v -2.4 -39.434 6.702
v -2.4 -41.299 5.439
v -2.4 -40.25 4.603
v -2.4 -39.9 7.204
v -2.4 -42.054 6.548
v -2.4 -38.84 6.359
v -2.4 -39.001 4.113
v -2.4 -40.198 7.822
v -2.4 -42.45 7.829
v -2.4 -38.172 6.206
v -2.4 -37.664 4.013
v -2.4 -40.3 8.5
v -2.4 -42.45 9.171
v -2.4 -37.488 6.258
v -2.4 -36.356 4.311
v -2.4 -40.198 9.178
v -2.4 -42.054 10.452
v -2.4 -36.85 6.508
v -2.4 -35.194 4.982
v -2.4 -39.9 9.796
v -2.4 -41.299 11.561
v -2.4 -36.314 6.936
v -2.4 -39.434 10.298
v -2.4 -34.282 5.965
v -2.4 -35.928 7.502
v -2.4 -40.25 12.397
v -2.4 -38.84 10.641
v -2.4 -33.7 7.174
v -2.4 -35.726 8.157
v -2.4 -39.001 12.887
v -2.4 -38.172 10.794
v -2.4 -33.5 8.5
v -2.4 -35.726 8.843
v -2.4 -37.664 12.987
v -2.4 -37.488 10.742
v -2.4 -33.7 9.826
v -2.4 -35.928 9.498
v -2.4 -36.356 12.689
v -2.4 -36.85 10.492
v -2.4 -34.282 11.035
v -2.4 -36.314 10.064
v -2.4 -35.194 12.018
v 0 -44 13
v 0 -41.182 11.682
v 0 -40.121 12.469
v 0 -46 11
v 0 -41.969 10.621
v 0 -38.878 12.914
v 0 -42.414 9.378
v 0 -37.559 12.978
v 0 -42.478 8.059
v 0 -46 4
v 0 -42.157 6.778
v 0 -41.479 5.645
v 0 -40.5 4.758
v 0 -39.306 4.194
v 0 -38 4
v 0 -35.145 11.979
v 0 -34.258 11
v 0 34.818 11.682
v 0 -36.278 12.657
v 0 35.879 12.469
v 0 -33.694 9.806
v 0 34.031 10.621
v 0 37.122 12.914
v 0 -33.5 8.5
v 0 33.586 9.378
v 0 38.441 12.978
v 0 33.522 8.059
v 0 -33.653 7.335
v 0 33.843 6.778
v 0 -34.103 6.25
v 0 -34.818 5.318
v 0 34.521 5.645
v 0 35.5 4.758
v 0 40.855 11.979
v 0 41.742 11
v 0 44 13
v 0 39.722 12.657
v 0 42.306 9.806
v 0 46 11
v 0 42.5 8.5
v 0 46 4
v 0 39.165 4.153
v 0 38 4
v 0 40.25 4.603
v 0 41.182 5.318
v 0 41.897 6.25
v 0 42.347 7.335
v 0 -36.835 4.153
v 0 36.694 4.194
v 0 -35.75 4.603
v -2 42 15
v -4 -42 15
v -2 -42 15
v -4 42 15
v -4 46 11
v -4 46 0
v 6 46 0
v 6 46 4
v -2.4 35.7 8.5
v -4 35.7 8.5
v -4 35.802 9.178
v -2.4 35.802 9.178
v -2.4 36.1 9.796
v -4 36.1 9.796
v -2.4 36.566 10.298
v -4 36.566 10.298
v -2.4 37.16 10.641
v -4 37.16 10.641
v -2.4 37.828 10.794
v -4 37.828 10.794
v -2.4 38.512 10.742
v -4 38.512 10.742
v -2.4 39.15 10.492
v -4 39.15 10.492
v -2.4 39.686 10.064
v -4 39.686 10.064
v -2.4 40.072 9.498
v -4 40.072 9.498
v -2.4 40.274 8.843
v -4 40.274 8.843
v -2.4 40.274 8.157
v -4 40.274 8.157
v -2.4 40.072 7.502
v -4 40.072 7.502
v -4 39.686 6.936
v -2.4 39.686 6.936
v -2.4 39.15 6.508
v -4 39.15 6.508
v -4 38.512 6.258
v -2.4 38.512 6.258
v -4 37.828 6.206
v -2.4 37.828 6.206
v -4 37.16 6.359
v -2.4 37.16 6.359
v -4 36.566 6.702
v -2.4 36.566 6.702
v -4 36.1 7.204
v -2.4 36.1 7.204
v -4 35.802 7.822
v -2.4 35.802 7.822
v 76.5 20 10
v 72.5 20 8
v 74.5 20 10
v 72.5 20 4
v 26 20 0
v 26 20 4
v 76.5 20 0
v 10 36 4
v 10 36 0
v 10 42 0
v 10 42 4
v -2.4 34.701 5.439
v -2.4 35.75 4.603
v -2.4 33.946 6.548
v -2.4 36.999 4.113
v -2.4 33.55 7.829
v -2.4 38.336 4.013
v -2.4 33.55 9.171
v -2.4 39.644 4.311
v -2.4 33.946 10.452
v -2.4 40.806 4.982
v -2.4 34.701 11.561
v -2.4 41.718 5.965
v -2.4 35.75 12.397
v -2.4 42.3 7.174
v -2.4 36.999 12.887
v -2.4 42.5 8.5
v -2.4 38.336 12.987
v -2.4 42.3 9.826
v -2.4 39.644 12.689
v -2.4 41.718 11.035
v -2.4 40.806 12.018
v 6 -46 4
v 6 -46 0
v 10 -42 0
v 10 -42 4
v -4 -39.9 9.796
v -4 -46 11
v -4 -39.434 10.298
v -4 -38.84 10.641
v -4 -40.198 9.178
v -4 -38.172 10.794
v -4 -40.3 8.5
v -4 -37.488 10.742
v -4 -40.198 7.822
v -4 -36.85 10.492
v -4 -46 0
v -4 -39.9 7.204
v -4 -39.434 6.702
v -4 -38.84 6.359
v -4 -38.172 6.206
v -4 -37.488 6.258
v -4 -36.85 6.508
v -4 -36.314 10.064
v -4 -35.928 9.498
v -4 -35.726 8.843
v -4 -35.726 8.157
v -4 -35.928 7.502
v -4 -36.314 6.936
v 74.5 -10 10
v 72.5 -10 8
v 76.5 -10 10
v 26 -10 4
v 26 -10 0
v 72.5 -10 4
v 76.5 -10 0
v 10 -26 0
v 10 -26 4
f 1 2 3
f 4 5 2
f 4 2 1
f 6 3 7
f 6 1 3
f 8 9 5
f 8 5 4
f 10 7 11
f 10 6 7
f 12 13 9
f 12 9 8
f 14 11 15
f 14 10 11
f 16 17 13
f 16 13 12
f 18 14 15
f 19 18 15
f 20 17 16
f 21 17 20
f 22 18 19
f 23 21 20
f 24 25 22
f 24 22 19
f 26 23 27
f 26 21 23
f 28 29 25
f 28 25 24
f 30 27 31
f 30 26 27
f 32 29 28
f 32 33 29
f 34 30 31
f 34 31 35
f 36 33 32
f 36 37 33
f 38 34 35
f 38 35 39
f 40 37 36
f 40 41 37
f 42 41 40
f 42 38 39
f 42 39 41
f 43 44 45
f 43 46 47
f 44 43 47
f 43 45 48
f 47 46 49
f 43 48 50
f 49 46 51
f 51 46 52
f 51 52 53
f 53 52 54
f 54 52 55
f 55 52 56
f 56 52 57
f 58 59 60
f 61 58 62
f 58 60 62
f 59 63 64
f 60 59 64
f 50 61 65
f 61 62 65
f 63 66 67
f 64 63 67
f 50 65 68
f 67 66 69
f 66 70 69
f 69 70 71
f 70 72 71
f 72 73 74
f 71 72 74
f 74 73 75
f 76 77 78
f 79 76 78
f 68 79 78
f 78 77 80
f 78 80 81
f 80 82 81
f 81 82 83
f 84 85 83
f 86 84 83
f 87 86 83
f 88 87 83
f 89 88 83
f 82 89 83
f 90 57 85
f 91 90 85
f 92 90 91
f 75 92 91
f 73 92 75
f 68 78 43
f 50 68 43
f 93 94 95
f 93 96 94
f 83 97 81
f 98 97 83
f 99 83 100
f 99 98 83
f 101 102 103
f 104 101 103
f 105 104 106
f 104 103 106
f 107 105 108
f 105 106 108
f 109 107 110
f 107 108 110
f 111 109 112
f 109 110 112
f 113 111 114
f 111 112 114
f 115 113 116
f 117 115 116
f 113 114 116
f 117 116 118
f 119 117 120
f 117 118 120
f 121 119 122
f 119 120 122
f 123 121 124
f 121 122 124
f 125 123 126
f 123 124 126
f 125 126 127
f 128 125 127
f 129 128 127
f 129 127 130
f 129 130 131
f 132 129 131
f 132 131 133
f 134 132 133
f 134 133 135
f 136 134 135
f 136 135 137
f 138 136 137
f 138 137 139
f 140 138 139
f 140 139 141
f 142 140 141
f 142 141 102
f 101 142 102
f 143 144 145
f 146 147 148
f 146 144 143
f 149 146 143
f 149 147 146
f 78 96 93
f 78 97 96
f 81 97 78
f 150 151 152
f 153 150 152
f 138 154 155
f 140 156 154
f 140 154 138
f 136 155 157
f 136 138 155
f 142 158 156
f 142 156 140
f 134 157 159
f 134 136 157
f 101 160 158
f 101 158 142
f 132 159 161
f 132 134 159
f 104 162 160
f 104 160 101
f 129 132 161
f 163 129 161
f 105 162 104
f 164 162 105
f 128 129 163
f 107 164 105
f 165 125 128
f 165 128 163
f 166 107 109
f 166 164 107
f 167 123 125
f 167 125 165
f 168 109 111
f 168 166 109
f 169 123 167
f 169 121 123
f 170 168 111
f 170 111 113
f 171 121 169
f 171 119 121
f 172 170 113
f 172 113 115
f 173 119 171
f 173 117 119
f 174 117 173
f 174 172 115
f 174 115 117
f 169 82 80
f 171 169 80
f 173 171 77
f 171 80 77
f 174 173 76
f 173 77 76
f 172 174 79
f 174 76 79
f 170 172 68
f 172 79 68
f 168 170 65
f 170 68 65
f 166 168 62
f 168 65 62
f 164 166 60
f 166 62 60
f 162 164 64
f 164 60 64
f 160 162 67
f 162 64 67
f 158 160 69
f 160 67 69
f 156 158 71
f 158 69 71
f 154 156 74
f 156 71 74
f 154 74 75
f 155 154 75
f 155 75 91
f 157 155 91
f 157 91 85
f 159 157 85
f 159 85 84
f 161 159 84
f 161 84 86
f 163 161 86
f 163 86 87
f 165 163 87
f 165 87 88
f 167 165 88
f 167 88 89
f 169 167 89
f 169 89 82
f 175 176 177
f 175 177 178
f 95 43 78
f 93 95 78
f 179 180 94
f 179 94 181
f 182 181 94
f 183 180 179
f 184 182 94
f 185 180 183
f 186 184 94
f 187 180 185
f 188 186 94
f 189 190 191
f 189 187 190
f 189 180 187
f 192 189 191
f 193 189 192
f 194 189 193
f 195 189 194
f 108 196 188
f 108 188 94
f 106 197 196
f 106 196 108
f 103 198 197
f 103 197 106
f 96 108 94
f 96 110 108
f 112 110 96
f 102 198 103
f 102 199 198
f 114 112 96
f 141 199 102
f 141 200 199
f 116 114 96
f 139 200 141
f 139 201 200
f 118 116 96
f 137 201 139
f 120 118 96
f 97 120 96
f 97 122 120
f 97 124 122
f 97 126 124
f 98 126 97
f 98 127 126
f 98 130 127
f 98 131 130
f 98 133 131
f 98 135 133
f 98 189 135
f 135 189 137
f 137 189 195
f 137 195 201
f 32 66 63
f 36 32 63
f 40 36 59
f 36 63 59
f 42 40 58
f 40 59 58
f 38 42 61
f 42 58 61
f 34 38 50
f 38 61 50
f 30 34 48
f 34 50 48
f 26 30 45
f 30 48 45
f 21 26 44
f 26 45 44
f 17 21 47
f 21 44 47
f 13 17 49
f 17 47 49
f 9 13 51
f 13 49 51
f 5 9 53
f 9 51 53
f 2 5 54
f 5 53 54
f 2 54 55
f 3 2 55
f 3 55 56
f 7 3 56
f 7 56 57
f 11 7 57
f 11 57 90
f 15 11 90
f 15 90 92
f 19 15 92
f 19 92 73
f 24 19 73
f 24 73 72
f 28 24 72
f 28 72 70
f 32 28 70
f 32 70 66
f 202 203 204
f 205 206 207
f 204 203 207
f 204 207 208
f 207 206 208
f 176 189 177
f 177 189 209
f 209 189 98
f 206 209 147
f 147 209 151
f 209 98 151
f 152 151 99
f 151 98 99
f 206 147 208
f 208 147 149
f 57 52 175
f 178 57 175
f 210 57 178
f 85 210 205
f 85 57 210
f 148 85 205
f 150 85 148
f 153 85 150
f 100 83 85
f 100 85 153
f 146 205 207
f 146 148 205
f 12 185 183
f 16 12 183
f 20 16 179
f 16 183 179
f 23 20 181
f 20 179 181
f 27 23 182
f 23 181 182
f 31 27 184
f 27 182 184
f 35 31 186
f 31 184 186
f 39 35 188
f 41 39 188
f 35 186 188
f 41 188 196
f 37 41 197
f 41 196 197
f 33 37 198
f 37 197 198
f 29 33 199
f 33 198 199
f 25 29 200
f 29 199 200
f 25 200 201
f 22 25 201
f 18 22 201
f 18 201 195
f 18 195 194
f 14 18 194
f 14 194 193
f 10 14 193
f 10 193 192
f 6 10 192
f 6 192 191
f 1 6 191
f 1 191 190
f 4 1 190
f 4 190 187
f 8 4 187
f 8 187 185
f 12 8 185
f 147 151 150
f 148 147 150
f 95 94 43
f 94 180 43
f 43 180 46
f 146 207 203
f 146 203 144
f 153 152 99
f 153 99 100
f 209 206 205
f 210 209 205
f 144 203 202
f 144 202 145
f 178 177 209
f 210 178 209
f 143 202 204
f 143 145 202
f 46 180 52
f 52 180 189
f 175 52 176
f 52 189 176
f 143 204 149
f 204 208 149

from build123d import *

# Parameters (mm, degrees)
F2_DEPTH  = 4
F3_W      = 4
F3_H      = 30
F4_DEPTH  = 6
F5_SIZE   = 16
F6_SIZE   = 2
F7_SIZE   = 4
F8_W      = 4
F8_H      = 92
F9_DEPTH  = 11
F10_R     = 4.5
F11_DEPTH = 2.4
F12_R     = 2.3
F13_DEPTH = 4
F14_SIZE  = 4
F15_SIZE  = 1.99999


# Not quite as in the source:
# - a fillet or chamfer is up to 0.001 mm smaller than in the source, because OpenCascade refuses the exact size


with BuildPart() as f2:
    # F1 (on Top) → F2 (new body)
    with BuildSketch(Plane.XY):
        Polygon((10, 46), (-4, 46), (-4, -46), (10, -46), (10, -10), (76.5, -10), (76.5, 20), (10, 20), align=None)
    extrude(amount=F2_DEPTH)

    # F3 (on face) → F4 (join)
    with BuildSketch(Plane.XY.offset(4)):
        with Locations((74.5, 5)):
            Rectangle(F3_W, F3_H)
    extrude(amount=F4_DEPTH)

    # F5
    f5_edges = [f2.edges().sort_by_distance(p)[0] for p in [
        (10, 20, 2),
        (10, -10, 2),
    ]]
    chamfer(f5_edges, length=F5_SIZE)

    # F6
    f6_edges = [f2.edges().sort_by_distance(p)[0] for p in [
        (72.5, 5, 10),
    ]]
    chamfer(f6_edges, length=F6_SIZE)

    # F7
    f7_edges = [f2.edges().sort_by_distance(p)[0] for p in [
        (10, -46, 2),
        (10, 46, 2),
    ]]
    chamfer(f7_edges, length=F7_SIZE)

    # F8 (on face) → F9 (join)
    with BuildSketch(Plane.XY.offset(4)):
        with Locations((-2, 0)):
            Rectangle(F8_W, F8_H)
    extrude(amount=F9_DEPTH)

    # F10 (on face) → F11 (cut)
    with BuildSketch(Plane.YZ):
        with Locations((-38, 8.5)):
            Circle(F10_R)
        with Locations((38, 8.5)):
            Circle(F10_R)
    extrude(amount=-F11_DEPTH, mode=Mode.SUBTRACT)

    # F12 (on face) → F13 (cut, through all)
    with BuildSketch(Plane(origin=(-4, 0, 0), x_dir=(0, -1, 0), z_dir=(-1, 0, 0))):
        with Locations((-38, 8.5)):
            Circle(F12_R)
        with Locations((38, 8.5)):
            Circle(F12_R)
    extrude(amount=-F13_DEPTH, mode=Mode.SUBTRACT)

    # F14
    f14_edges = [f2.edges().sort_by_distance(p)[0] for p in [
        (-2, -46, 15),
        (-2, 46, 15),
    ]]
    chamfer(f14_edges, length=F14_SIZE)

    # F15 (size 2 in the source; OpenCascade refuses exactly that, so slightly less here)
    f15_edges = [f2.edges().sort_by_distance(p)[0] for p in [
        (0, 0, 15),
    ]]
    chamfer(f15_edges, length=F15_SIZE)


solid = f2.part
